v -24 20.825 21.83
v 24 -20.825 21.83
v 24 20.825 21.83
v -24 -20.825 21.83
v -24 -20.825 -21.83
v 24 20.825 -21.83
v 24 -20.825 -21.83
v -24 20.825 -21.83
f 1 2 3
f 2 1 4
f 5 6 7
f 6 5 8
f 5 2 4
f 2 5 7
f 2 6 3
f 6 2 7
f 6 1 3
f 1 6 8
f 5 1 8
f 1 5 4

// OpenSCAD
// Parametric Adapter Stand Model
// Converted from 3MF mesh
// Dimensions: 48.0 x 41.6 x 43.7 mm

// === ADJUSTABLE PARAMETERS ===
overall_width = 48.00;
overall_depth = 41.65;
overall_height = 43.66;

// Resolution
$fn = 64;  // Higher = smoother curves

// === DETECTED FEATURES ===

// Rectangular sections
// x_planes: 16 detected
// y_planes: 26 detected
// z_planes: 38 detected

// === MODEL CONSTRUCTION ===

module base_structure() {
    // Main body - customize this based on your needs
    translate([0, 0, 0])
        cube([overall_width, overall_depth, overall_height], center=true);
}

// === FINAL ASSEMBLY ===
// Uncomment/modify as needed

union() {
    base_structure();
    
}
